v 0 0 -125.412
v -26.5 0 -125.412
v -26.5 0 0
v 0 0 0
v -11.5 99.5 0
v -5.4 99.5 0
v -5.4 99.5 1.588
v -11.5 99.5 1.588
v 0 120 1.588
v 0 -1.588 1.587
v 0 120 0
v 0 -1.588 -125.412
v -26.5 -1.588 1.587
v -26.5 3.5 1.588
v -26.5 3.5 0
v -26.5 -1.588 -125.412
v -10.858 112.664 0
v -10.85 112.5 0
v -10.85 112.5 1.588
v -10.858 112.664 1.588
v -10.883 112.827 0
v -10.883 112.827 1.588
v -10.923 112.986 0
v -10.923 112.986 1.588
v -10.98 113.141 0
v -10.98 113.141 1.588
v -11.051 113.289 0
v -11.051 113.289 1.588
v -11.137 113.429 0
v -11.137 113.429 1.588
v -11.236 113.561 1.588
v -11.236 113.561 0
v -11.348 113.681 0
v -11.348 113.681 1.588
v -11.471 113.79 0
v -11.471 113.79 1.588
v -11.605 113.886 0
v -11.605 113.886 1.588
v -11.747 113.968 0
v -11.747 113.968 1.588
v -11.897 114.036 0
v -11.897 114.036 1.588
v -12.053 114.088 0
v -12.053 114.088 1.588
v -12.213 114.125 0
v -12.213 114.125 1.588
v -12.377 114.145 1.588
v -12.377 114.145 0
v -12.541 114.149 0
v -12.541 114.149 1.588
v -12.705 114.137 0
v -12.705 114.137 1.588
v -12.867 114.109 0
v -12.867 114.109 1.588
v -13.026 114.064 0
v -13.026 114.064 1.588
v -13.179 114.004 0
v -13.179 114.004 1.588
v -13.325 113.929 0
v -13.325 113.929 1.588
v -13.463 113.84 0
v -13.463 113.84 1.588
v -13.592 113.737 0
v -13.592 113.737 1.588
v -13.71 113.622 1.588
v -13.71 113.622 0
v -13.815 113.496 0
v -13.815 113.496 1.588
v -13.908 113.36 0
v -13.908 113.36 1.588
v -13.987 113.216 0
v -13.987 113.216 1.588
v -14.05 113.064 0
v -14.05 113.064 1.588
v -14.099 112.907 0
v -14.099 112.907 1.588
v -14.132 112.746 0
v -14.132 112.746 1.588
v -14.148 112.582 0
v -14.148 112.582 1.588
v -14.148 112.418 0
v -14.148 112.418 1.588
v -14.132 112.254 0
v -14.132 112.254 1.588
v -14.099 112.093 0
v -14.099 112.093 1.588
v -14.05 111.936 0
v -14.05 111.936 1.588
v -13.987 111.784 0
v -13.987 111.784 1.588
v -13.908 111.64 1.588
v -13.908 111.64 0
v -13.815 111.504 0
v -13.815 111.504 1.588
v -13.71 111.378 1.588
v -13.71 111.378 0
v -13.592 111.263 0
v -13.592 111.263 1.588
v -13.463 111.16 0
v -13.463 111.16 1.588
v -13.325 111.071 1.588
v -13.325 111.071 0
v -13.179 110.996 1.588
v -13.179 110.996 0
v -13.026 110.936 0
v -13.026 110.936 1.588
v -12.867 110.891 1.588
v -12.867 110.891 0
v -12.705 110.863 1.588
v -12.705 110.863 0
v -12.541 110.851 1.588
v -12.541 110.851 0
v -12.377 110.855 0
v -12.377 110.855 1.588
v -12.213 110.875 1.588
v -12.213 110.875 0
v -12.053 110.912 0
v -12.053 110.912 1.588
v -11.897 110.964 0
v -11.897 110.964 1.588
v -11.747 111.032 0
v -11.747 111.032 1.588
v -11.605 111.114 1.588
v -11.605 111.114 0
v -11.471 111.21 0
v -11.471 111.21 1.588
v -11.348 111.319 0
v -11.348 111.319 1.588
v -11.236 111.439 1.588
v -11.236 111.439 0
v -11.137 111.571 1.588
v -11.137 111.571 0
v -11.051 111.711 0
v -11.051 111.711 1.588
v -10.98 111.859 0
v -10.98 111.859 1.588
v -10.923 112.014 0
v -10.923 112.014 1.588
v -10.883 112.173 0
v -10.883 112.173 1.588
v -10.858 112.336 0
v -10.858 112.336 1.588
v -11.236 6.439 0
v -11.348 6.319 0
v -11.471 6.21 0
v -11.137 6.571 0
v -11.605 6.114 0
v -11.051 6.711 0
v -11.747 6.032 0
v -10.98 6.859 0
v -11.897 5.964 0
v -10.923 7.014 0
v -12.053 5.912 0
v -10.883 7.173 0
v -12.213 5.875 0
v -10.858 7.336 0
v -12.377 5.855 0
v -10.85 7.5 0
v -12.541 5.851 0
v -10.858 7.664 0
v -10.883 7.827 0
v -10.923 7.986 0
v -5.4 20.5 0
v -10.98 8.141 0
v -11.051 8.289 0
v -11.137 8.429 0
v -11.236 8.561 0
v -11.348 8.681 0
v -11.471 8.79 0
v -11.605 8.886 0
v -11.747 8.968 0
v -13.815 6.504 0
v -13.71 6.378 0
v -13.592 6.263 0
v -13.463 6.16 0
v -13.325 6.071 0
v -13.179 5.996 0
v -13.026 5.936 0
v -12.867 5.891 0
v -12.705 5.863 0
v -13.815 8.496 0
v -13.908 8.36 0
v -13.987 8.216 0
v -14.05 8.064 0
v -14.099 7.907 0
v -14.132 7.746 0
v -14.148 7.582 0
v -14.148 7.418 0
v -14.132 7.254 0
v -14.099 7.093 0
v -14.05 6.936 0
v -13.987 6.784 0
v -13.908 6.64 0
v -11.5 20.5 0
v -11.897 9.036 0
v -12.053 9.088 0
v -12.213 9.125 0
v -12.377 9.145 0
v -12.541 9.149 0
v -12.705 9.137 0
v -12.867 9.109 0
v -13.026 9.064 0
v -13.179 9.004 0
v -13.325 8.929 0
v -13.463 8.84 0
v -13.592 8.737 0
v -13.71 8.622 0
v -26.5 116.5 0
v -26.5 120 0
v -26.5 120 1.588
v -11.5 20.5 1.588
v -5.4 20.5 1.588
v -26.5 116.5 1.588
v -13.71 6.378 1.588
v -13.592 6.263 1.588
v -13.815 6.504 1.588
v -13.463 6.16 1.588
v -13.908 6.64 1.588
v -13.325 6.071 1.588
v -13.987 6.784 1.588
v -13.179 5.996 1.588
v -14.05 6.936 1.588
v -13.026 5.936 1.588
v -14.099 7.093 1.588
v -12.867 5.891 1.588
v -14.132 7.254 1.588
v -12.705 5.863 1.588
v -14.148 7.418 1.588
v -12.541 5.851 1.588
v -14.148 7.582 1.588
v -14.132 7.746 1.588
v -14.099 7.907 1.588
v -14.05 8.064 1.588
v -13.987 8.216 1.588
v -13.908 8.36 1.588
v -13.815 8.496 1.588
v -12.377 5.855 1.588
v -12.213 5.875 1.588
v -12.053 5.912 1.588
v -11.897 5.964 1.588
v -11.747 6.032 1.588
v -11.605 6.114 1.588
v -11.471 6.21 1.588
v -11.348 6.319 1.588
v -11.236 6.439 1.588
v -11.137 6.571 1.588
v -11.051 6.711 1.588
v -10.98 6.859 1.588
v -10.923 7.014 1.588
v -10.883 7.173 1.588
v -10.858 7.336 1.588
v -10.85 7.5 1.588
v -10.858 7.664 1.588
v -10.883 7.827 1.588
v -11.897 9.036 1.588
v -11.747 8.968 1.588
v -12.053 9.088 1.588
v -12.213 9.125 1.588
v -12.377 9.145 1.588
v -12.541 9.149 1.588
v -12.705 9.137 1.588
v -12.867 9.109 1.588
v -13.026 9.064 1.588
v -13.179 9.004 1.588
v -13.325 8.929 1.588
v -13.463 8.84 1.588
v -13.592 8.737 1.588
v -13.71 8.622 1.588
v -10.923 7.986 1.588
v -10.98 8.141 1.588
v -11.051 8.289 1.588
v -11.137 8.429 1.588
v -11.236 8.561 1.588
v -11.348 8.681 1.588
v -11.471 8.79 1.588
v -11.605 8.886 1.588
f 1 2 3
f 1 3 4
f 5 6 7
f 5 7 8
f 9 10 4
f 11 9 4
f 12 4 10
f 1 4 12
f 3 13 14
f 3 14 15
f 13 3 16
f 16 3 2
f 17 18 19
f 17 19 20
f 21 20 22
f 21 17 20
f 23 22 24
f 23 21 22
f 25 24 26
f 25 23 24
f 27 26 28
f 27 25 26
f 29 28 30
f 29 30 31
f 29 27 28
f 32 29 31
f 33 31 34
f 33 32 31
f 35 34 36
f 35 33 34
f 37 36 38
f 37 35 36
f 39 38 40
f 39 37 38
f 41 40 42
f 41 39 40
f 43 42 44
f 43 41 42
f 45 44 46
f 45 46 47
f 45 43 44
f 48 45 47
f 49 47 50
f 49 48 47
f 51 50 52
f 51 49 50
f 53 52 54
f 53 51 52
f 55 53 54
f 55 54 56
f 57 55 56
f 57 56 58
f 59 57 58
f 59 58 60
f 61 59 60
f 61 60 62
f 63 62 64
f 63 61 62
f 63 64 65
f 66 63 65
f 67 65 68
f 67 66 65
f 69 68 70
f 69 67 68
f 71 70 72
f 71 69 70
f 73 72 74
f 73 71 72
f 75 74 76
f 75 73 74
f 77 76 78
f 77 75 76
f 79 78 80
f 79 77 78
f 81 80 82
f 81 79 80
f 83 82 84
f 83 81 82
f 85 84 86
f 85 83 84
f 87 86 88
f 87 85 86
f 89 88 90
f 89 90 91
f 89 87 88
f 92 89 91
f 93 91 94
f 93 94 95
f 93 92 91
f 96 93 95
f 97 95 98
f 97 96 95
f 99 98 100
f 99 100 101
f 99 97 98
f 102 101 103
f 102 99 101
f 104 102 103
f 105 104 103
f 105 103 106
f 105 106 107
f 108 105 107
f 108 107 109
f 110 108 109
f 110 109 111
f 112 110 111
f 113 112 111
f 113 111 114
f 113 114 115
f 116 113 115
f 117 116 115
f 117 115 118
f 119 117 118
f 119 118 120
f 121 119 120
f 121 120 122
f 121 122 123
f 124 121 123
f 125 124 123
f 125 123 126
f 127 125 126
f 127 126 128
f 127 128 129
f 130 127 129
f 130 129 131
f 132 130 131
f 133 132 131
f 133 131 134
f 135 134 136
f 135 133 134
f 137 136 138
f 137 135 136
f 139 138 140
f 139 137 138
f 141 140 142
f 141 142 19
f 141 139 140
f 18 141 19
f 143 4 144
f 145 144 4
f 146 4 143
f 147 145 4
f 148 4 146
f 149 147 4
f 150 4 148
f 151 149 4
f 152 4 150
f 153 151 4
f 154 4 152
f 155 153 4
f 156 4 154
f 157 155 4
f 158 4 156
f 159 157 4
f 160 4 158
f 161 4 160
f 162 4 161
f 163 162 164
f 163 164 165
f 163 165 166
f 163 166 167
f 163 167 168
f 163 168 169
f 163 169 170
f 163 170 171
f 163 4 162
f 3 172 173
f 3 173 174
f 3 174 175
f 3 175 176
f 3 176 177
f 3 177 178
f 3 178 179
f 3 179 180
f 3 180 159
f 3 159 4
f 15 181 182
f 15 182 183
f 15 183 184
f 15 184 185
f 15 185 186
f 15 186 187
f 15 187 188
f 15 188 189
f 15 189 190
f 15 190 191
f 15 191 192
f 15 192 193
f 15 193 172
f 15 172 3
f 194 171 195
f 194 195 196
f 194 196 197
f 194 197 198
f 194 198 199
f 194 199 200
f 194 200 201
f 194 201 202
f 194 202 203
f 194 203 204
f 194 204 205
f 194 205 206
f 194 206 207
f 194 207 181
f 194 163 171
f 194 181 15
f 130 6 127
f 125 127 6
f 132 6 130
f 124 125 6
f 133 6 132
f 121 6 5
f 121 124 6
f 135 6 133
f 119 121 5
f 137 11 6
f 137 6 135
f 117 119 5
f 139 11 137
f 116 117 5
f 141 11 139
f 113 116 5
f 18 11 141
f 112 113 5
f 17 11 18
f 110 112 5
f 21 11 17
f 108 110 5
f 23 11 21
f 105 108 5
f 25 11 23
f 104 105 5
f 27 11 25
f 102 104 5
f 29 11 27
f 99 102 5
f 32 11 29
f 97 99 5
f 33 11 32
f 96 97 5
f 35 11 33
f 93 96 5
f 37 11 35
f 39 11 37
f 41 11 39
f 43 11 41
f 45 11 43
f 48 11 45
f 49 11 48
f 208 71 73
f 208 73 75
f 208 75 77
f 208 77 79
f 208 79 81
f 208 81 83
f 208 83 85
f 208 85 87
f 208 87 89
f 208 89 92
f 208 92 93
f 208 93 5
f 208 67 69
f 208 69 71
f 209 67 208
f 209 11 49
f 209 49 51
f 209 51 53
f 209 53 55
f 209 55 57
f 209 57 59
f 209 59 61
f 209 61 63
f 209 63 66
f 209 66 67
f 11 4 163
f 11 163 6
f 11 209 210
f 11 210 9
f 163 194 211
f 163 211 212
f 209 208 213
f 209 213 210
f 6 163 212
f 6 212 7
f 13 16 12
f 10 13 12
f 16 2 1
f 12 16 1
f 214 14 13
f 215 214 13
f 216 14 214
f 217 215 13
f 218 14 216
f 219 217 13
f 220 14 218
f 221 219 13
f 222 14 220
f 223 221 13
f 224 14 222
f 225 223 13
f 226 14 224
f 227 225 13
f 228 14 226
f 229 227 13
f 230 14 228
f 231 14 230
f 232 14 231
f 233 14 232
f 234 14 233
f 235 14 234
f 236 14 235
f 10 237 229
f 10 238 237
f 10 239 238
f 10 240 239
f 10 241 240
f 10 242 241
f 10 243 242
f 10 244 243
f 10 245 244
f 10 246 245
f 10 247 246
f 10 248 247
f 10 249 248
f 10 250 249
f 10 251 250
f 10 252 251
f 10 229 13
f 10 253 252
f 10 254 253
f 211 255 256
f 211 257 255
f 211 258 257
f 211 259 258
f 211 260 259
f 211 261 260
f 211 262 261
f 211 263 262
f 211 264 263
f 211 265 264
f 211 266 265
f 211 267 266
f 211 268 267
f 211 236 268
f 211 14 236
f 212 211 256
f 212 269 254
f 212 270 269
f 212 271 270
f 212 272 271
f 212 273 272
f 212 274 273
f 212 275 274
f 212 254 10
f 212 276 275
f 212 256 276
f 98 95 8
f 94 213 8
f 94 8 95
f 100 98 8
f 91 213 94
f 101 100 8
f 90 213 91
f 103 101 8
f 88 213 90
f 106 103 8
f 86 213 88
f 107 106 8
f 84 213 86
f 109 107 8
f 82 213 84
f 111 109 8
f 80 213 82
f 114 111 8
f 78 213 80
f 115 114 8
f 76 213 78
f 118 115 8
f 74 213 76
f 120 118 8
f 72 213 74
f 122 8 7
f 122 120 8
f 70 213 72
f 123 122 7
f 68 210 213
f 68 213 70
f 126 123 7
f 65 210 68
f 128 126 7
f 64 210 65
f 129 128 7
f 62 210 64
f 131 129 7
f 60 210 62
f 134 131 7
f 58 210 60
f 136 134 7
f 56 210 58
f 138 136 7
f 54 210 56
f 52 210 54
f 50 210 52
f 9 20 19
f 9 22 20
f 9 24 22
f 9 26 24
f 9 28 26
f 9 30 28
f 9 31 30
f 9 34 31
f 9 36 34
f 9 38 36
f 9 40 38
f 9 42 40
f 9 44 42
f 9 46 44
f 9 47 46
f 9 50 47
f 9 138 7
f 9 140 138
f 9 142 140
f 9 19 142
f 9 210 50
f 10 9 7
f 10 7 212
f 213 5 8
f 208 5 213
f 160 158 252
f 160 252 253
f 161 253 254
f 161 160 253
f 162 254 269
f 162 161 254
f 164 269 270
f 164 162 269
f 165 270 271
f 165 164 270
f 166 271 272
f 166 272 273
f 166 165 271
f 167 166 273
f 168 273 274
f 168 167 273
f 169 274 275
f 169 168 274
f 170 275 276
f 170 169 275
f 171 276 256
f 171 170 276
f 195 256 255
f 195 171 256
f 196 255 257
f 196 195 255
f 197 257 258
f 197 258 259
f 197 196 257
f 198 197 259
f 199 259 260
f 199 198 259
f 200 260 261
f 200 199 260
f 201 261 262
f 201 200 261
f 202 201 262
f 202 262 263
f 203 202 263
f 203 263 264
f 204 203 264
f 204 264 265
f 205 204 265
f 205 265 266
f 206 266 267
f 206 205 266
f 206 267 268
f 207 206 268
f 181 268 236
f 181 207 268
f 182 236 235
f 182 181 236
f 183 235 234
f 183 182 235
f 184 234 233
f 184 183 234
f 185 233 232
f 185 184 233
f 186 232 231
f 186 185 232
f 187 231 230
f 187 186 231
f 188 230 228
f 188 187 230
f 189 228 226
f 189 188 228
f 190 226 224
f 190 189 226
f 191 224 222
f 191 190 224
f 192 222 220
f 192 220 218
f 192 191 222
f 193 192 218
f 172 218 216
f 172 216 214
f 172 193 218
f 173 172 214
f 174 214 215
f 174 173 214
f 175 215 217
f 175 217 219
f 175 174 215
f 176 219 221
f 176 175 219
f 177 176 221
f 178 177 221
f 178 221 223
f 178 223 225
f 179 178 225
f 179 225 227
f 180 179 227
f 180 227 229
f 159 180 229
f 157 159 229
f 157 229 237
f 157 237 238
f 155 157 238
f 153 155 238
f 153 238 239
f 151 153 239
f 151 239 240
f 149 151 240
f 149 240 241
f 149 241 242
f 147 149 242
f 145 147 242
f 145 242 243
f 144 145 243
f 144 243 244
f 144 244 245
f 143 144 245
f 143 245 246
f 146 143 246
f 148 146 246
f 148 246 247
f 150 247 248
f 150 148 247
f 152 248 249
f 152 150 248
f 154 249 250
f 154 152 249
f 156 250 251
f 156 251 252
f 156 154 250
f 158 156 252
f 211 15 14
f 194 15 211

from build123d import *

# Parameters (mm, degrees)
BOSS_EXTRUDE1_DEPTH = 1.5875
SKETCH2_W           = 26.5
SKETCH2_H           = 127
BOSS_EXTRUDE2_DEPTH = 1.5875


with BuildPart() as part:
    # Sketch1 → Boss-Extrude1 (new body)
    with BuildSketch(Plane.XY):
        Polygon((-26.5, 120), (0, 120), (0, 0), (-26.5, 0), (-26.5, 3.5), (-11.5, 20.5), (-5.4, 20.5), (-5.4, 99.5), (-11.5, 99.5), (-26.5, 116.5), align=None)
        with BuildLine():
            ThreePointArc((-14.15, 112.5), (-12.5, 110.85), (-10.85, 112.5))
            ThreePointArc((-10.85, 112.5), (-12.5, 114.15), (-14.15, 112.5))
        make_face(mode=Mode.SUBTRACT)
        with BuildLine():
            ThreePointArc((-14.15, 7.5), (-12.5, 5.85), (-10.85, 7.5))
            ThreePointArc((-10.85, 7.5), (-12.5, 9.15), (-14.15, 7.5))
        make_face(mode=Mode.SUBTRACT)
    extrude(amount=BOSS_EXTRUDE1_DEPTH)

    # Sketch2 → Boss-Extrude2 (add)
    with BuildSketch(Plane(origin=(0, 0, 0), x_dir=(1, 0, 0), z_dir=(0, 1, 0))):
        with Locations((-13.25, 61.9125)):
            Rectangle(SKETCH2_W, SKETCH2_H)
    extrude(amount=-BOSS_EXTRUDE2_DEPTH)


solid = part.part
